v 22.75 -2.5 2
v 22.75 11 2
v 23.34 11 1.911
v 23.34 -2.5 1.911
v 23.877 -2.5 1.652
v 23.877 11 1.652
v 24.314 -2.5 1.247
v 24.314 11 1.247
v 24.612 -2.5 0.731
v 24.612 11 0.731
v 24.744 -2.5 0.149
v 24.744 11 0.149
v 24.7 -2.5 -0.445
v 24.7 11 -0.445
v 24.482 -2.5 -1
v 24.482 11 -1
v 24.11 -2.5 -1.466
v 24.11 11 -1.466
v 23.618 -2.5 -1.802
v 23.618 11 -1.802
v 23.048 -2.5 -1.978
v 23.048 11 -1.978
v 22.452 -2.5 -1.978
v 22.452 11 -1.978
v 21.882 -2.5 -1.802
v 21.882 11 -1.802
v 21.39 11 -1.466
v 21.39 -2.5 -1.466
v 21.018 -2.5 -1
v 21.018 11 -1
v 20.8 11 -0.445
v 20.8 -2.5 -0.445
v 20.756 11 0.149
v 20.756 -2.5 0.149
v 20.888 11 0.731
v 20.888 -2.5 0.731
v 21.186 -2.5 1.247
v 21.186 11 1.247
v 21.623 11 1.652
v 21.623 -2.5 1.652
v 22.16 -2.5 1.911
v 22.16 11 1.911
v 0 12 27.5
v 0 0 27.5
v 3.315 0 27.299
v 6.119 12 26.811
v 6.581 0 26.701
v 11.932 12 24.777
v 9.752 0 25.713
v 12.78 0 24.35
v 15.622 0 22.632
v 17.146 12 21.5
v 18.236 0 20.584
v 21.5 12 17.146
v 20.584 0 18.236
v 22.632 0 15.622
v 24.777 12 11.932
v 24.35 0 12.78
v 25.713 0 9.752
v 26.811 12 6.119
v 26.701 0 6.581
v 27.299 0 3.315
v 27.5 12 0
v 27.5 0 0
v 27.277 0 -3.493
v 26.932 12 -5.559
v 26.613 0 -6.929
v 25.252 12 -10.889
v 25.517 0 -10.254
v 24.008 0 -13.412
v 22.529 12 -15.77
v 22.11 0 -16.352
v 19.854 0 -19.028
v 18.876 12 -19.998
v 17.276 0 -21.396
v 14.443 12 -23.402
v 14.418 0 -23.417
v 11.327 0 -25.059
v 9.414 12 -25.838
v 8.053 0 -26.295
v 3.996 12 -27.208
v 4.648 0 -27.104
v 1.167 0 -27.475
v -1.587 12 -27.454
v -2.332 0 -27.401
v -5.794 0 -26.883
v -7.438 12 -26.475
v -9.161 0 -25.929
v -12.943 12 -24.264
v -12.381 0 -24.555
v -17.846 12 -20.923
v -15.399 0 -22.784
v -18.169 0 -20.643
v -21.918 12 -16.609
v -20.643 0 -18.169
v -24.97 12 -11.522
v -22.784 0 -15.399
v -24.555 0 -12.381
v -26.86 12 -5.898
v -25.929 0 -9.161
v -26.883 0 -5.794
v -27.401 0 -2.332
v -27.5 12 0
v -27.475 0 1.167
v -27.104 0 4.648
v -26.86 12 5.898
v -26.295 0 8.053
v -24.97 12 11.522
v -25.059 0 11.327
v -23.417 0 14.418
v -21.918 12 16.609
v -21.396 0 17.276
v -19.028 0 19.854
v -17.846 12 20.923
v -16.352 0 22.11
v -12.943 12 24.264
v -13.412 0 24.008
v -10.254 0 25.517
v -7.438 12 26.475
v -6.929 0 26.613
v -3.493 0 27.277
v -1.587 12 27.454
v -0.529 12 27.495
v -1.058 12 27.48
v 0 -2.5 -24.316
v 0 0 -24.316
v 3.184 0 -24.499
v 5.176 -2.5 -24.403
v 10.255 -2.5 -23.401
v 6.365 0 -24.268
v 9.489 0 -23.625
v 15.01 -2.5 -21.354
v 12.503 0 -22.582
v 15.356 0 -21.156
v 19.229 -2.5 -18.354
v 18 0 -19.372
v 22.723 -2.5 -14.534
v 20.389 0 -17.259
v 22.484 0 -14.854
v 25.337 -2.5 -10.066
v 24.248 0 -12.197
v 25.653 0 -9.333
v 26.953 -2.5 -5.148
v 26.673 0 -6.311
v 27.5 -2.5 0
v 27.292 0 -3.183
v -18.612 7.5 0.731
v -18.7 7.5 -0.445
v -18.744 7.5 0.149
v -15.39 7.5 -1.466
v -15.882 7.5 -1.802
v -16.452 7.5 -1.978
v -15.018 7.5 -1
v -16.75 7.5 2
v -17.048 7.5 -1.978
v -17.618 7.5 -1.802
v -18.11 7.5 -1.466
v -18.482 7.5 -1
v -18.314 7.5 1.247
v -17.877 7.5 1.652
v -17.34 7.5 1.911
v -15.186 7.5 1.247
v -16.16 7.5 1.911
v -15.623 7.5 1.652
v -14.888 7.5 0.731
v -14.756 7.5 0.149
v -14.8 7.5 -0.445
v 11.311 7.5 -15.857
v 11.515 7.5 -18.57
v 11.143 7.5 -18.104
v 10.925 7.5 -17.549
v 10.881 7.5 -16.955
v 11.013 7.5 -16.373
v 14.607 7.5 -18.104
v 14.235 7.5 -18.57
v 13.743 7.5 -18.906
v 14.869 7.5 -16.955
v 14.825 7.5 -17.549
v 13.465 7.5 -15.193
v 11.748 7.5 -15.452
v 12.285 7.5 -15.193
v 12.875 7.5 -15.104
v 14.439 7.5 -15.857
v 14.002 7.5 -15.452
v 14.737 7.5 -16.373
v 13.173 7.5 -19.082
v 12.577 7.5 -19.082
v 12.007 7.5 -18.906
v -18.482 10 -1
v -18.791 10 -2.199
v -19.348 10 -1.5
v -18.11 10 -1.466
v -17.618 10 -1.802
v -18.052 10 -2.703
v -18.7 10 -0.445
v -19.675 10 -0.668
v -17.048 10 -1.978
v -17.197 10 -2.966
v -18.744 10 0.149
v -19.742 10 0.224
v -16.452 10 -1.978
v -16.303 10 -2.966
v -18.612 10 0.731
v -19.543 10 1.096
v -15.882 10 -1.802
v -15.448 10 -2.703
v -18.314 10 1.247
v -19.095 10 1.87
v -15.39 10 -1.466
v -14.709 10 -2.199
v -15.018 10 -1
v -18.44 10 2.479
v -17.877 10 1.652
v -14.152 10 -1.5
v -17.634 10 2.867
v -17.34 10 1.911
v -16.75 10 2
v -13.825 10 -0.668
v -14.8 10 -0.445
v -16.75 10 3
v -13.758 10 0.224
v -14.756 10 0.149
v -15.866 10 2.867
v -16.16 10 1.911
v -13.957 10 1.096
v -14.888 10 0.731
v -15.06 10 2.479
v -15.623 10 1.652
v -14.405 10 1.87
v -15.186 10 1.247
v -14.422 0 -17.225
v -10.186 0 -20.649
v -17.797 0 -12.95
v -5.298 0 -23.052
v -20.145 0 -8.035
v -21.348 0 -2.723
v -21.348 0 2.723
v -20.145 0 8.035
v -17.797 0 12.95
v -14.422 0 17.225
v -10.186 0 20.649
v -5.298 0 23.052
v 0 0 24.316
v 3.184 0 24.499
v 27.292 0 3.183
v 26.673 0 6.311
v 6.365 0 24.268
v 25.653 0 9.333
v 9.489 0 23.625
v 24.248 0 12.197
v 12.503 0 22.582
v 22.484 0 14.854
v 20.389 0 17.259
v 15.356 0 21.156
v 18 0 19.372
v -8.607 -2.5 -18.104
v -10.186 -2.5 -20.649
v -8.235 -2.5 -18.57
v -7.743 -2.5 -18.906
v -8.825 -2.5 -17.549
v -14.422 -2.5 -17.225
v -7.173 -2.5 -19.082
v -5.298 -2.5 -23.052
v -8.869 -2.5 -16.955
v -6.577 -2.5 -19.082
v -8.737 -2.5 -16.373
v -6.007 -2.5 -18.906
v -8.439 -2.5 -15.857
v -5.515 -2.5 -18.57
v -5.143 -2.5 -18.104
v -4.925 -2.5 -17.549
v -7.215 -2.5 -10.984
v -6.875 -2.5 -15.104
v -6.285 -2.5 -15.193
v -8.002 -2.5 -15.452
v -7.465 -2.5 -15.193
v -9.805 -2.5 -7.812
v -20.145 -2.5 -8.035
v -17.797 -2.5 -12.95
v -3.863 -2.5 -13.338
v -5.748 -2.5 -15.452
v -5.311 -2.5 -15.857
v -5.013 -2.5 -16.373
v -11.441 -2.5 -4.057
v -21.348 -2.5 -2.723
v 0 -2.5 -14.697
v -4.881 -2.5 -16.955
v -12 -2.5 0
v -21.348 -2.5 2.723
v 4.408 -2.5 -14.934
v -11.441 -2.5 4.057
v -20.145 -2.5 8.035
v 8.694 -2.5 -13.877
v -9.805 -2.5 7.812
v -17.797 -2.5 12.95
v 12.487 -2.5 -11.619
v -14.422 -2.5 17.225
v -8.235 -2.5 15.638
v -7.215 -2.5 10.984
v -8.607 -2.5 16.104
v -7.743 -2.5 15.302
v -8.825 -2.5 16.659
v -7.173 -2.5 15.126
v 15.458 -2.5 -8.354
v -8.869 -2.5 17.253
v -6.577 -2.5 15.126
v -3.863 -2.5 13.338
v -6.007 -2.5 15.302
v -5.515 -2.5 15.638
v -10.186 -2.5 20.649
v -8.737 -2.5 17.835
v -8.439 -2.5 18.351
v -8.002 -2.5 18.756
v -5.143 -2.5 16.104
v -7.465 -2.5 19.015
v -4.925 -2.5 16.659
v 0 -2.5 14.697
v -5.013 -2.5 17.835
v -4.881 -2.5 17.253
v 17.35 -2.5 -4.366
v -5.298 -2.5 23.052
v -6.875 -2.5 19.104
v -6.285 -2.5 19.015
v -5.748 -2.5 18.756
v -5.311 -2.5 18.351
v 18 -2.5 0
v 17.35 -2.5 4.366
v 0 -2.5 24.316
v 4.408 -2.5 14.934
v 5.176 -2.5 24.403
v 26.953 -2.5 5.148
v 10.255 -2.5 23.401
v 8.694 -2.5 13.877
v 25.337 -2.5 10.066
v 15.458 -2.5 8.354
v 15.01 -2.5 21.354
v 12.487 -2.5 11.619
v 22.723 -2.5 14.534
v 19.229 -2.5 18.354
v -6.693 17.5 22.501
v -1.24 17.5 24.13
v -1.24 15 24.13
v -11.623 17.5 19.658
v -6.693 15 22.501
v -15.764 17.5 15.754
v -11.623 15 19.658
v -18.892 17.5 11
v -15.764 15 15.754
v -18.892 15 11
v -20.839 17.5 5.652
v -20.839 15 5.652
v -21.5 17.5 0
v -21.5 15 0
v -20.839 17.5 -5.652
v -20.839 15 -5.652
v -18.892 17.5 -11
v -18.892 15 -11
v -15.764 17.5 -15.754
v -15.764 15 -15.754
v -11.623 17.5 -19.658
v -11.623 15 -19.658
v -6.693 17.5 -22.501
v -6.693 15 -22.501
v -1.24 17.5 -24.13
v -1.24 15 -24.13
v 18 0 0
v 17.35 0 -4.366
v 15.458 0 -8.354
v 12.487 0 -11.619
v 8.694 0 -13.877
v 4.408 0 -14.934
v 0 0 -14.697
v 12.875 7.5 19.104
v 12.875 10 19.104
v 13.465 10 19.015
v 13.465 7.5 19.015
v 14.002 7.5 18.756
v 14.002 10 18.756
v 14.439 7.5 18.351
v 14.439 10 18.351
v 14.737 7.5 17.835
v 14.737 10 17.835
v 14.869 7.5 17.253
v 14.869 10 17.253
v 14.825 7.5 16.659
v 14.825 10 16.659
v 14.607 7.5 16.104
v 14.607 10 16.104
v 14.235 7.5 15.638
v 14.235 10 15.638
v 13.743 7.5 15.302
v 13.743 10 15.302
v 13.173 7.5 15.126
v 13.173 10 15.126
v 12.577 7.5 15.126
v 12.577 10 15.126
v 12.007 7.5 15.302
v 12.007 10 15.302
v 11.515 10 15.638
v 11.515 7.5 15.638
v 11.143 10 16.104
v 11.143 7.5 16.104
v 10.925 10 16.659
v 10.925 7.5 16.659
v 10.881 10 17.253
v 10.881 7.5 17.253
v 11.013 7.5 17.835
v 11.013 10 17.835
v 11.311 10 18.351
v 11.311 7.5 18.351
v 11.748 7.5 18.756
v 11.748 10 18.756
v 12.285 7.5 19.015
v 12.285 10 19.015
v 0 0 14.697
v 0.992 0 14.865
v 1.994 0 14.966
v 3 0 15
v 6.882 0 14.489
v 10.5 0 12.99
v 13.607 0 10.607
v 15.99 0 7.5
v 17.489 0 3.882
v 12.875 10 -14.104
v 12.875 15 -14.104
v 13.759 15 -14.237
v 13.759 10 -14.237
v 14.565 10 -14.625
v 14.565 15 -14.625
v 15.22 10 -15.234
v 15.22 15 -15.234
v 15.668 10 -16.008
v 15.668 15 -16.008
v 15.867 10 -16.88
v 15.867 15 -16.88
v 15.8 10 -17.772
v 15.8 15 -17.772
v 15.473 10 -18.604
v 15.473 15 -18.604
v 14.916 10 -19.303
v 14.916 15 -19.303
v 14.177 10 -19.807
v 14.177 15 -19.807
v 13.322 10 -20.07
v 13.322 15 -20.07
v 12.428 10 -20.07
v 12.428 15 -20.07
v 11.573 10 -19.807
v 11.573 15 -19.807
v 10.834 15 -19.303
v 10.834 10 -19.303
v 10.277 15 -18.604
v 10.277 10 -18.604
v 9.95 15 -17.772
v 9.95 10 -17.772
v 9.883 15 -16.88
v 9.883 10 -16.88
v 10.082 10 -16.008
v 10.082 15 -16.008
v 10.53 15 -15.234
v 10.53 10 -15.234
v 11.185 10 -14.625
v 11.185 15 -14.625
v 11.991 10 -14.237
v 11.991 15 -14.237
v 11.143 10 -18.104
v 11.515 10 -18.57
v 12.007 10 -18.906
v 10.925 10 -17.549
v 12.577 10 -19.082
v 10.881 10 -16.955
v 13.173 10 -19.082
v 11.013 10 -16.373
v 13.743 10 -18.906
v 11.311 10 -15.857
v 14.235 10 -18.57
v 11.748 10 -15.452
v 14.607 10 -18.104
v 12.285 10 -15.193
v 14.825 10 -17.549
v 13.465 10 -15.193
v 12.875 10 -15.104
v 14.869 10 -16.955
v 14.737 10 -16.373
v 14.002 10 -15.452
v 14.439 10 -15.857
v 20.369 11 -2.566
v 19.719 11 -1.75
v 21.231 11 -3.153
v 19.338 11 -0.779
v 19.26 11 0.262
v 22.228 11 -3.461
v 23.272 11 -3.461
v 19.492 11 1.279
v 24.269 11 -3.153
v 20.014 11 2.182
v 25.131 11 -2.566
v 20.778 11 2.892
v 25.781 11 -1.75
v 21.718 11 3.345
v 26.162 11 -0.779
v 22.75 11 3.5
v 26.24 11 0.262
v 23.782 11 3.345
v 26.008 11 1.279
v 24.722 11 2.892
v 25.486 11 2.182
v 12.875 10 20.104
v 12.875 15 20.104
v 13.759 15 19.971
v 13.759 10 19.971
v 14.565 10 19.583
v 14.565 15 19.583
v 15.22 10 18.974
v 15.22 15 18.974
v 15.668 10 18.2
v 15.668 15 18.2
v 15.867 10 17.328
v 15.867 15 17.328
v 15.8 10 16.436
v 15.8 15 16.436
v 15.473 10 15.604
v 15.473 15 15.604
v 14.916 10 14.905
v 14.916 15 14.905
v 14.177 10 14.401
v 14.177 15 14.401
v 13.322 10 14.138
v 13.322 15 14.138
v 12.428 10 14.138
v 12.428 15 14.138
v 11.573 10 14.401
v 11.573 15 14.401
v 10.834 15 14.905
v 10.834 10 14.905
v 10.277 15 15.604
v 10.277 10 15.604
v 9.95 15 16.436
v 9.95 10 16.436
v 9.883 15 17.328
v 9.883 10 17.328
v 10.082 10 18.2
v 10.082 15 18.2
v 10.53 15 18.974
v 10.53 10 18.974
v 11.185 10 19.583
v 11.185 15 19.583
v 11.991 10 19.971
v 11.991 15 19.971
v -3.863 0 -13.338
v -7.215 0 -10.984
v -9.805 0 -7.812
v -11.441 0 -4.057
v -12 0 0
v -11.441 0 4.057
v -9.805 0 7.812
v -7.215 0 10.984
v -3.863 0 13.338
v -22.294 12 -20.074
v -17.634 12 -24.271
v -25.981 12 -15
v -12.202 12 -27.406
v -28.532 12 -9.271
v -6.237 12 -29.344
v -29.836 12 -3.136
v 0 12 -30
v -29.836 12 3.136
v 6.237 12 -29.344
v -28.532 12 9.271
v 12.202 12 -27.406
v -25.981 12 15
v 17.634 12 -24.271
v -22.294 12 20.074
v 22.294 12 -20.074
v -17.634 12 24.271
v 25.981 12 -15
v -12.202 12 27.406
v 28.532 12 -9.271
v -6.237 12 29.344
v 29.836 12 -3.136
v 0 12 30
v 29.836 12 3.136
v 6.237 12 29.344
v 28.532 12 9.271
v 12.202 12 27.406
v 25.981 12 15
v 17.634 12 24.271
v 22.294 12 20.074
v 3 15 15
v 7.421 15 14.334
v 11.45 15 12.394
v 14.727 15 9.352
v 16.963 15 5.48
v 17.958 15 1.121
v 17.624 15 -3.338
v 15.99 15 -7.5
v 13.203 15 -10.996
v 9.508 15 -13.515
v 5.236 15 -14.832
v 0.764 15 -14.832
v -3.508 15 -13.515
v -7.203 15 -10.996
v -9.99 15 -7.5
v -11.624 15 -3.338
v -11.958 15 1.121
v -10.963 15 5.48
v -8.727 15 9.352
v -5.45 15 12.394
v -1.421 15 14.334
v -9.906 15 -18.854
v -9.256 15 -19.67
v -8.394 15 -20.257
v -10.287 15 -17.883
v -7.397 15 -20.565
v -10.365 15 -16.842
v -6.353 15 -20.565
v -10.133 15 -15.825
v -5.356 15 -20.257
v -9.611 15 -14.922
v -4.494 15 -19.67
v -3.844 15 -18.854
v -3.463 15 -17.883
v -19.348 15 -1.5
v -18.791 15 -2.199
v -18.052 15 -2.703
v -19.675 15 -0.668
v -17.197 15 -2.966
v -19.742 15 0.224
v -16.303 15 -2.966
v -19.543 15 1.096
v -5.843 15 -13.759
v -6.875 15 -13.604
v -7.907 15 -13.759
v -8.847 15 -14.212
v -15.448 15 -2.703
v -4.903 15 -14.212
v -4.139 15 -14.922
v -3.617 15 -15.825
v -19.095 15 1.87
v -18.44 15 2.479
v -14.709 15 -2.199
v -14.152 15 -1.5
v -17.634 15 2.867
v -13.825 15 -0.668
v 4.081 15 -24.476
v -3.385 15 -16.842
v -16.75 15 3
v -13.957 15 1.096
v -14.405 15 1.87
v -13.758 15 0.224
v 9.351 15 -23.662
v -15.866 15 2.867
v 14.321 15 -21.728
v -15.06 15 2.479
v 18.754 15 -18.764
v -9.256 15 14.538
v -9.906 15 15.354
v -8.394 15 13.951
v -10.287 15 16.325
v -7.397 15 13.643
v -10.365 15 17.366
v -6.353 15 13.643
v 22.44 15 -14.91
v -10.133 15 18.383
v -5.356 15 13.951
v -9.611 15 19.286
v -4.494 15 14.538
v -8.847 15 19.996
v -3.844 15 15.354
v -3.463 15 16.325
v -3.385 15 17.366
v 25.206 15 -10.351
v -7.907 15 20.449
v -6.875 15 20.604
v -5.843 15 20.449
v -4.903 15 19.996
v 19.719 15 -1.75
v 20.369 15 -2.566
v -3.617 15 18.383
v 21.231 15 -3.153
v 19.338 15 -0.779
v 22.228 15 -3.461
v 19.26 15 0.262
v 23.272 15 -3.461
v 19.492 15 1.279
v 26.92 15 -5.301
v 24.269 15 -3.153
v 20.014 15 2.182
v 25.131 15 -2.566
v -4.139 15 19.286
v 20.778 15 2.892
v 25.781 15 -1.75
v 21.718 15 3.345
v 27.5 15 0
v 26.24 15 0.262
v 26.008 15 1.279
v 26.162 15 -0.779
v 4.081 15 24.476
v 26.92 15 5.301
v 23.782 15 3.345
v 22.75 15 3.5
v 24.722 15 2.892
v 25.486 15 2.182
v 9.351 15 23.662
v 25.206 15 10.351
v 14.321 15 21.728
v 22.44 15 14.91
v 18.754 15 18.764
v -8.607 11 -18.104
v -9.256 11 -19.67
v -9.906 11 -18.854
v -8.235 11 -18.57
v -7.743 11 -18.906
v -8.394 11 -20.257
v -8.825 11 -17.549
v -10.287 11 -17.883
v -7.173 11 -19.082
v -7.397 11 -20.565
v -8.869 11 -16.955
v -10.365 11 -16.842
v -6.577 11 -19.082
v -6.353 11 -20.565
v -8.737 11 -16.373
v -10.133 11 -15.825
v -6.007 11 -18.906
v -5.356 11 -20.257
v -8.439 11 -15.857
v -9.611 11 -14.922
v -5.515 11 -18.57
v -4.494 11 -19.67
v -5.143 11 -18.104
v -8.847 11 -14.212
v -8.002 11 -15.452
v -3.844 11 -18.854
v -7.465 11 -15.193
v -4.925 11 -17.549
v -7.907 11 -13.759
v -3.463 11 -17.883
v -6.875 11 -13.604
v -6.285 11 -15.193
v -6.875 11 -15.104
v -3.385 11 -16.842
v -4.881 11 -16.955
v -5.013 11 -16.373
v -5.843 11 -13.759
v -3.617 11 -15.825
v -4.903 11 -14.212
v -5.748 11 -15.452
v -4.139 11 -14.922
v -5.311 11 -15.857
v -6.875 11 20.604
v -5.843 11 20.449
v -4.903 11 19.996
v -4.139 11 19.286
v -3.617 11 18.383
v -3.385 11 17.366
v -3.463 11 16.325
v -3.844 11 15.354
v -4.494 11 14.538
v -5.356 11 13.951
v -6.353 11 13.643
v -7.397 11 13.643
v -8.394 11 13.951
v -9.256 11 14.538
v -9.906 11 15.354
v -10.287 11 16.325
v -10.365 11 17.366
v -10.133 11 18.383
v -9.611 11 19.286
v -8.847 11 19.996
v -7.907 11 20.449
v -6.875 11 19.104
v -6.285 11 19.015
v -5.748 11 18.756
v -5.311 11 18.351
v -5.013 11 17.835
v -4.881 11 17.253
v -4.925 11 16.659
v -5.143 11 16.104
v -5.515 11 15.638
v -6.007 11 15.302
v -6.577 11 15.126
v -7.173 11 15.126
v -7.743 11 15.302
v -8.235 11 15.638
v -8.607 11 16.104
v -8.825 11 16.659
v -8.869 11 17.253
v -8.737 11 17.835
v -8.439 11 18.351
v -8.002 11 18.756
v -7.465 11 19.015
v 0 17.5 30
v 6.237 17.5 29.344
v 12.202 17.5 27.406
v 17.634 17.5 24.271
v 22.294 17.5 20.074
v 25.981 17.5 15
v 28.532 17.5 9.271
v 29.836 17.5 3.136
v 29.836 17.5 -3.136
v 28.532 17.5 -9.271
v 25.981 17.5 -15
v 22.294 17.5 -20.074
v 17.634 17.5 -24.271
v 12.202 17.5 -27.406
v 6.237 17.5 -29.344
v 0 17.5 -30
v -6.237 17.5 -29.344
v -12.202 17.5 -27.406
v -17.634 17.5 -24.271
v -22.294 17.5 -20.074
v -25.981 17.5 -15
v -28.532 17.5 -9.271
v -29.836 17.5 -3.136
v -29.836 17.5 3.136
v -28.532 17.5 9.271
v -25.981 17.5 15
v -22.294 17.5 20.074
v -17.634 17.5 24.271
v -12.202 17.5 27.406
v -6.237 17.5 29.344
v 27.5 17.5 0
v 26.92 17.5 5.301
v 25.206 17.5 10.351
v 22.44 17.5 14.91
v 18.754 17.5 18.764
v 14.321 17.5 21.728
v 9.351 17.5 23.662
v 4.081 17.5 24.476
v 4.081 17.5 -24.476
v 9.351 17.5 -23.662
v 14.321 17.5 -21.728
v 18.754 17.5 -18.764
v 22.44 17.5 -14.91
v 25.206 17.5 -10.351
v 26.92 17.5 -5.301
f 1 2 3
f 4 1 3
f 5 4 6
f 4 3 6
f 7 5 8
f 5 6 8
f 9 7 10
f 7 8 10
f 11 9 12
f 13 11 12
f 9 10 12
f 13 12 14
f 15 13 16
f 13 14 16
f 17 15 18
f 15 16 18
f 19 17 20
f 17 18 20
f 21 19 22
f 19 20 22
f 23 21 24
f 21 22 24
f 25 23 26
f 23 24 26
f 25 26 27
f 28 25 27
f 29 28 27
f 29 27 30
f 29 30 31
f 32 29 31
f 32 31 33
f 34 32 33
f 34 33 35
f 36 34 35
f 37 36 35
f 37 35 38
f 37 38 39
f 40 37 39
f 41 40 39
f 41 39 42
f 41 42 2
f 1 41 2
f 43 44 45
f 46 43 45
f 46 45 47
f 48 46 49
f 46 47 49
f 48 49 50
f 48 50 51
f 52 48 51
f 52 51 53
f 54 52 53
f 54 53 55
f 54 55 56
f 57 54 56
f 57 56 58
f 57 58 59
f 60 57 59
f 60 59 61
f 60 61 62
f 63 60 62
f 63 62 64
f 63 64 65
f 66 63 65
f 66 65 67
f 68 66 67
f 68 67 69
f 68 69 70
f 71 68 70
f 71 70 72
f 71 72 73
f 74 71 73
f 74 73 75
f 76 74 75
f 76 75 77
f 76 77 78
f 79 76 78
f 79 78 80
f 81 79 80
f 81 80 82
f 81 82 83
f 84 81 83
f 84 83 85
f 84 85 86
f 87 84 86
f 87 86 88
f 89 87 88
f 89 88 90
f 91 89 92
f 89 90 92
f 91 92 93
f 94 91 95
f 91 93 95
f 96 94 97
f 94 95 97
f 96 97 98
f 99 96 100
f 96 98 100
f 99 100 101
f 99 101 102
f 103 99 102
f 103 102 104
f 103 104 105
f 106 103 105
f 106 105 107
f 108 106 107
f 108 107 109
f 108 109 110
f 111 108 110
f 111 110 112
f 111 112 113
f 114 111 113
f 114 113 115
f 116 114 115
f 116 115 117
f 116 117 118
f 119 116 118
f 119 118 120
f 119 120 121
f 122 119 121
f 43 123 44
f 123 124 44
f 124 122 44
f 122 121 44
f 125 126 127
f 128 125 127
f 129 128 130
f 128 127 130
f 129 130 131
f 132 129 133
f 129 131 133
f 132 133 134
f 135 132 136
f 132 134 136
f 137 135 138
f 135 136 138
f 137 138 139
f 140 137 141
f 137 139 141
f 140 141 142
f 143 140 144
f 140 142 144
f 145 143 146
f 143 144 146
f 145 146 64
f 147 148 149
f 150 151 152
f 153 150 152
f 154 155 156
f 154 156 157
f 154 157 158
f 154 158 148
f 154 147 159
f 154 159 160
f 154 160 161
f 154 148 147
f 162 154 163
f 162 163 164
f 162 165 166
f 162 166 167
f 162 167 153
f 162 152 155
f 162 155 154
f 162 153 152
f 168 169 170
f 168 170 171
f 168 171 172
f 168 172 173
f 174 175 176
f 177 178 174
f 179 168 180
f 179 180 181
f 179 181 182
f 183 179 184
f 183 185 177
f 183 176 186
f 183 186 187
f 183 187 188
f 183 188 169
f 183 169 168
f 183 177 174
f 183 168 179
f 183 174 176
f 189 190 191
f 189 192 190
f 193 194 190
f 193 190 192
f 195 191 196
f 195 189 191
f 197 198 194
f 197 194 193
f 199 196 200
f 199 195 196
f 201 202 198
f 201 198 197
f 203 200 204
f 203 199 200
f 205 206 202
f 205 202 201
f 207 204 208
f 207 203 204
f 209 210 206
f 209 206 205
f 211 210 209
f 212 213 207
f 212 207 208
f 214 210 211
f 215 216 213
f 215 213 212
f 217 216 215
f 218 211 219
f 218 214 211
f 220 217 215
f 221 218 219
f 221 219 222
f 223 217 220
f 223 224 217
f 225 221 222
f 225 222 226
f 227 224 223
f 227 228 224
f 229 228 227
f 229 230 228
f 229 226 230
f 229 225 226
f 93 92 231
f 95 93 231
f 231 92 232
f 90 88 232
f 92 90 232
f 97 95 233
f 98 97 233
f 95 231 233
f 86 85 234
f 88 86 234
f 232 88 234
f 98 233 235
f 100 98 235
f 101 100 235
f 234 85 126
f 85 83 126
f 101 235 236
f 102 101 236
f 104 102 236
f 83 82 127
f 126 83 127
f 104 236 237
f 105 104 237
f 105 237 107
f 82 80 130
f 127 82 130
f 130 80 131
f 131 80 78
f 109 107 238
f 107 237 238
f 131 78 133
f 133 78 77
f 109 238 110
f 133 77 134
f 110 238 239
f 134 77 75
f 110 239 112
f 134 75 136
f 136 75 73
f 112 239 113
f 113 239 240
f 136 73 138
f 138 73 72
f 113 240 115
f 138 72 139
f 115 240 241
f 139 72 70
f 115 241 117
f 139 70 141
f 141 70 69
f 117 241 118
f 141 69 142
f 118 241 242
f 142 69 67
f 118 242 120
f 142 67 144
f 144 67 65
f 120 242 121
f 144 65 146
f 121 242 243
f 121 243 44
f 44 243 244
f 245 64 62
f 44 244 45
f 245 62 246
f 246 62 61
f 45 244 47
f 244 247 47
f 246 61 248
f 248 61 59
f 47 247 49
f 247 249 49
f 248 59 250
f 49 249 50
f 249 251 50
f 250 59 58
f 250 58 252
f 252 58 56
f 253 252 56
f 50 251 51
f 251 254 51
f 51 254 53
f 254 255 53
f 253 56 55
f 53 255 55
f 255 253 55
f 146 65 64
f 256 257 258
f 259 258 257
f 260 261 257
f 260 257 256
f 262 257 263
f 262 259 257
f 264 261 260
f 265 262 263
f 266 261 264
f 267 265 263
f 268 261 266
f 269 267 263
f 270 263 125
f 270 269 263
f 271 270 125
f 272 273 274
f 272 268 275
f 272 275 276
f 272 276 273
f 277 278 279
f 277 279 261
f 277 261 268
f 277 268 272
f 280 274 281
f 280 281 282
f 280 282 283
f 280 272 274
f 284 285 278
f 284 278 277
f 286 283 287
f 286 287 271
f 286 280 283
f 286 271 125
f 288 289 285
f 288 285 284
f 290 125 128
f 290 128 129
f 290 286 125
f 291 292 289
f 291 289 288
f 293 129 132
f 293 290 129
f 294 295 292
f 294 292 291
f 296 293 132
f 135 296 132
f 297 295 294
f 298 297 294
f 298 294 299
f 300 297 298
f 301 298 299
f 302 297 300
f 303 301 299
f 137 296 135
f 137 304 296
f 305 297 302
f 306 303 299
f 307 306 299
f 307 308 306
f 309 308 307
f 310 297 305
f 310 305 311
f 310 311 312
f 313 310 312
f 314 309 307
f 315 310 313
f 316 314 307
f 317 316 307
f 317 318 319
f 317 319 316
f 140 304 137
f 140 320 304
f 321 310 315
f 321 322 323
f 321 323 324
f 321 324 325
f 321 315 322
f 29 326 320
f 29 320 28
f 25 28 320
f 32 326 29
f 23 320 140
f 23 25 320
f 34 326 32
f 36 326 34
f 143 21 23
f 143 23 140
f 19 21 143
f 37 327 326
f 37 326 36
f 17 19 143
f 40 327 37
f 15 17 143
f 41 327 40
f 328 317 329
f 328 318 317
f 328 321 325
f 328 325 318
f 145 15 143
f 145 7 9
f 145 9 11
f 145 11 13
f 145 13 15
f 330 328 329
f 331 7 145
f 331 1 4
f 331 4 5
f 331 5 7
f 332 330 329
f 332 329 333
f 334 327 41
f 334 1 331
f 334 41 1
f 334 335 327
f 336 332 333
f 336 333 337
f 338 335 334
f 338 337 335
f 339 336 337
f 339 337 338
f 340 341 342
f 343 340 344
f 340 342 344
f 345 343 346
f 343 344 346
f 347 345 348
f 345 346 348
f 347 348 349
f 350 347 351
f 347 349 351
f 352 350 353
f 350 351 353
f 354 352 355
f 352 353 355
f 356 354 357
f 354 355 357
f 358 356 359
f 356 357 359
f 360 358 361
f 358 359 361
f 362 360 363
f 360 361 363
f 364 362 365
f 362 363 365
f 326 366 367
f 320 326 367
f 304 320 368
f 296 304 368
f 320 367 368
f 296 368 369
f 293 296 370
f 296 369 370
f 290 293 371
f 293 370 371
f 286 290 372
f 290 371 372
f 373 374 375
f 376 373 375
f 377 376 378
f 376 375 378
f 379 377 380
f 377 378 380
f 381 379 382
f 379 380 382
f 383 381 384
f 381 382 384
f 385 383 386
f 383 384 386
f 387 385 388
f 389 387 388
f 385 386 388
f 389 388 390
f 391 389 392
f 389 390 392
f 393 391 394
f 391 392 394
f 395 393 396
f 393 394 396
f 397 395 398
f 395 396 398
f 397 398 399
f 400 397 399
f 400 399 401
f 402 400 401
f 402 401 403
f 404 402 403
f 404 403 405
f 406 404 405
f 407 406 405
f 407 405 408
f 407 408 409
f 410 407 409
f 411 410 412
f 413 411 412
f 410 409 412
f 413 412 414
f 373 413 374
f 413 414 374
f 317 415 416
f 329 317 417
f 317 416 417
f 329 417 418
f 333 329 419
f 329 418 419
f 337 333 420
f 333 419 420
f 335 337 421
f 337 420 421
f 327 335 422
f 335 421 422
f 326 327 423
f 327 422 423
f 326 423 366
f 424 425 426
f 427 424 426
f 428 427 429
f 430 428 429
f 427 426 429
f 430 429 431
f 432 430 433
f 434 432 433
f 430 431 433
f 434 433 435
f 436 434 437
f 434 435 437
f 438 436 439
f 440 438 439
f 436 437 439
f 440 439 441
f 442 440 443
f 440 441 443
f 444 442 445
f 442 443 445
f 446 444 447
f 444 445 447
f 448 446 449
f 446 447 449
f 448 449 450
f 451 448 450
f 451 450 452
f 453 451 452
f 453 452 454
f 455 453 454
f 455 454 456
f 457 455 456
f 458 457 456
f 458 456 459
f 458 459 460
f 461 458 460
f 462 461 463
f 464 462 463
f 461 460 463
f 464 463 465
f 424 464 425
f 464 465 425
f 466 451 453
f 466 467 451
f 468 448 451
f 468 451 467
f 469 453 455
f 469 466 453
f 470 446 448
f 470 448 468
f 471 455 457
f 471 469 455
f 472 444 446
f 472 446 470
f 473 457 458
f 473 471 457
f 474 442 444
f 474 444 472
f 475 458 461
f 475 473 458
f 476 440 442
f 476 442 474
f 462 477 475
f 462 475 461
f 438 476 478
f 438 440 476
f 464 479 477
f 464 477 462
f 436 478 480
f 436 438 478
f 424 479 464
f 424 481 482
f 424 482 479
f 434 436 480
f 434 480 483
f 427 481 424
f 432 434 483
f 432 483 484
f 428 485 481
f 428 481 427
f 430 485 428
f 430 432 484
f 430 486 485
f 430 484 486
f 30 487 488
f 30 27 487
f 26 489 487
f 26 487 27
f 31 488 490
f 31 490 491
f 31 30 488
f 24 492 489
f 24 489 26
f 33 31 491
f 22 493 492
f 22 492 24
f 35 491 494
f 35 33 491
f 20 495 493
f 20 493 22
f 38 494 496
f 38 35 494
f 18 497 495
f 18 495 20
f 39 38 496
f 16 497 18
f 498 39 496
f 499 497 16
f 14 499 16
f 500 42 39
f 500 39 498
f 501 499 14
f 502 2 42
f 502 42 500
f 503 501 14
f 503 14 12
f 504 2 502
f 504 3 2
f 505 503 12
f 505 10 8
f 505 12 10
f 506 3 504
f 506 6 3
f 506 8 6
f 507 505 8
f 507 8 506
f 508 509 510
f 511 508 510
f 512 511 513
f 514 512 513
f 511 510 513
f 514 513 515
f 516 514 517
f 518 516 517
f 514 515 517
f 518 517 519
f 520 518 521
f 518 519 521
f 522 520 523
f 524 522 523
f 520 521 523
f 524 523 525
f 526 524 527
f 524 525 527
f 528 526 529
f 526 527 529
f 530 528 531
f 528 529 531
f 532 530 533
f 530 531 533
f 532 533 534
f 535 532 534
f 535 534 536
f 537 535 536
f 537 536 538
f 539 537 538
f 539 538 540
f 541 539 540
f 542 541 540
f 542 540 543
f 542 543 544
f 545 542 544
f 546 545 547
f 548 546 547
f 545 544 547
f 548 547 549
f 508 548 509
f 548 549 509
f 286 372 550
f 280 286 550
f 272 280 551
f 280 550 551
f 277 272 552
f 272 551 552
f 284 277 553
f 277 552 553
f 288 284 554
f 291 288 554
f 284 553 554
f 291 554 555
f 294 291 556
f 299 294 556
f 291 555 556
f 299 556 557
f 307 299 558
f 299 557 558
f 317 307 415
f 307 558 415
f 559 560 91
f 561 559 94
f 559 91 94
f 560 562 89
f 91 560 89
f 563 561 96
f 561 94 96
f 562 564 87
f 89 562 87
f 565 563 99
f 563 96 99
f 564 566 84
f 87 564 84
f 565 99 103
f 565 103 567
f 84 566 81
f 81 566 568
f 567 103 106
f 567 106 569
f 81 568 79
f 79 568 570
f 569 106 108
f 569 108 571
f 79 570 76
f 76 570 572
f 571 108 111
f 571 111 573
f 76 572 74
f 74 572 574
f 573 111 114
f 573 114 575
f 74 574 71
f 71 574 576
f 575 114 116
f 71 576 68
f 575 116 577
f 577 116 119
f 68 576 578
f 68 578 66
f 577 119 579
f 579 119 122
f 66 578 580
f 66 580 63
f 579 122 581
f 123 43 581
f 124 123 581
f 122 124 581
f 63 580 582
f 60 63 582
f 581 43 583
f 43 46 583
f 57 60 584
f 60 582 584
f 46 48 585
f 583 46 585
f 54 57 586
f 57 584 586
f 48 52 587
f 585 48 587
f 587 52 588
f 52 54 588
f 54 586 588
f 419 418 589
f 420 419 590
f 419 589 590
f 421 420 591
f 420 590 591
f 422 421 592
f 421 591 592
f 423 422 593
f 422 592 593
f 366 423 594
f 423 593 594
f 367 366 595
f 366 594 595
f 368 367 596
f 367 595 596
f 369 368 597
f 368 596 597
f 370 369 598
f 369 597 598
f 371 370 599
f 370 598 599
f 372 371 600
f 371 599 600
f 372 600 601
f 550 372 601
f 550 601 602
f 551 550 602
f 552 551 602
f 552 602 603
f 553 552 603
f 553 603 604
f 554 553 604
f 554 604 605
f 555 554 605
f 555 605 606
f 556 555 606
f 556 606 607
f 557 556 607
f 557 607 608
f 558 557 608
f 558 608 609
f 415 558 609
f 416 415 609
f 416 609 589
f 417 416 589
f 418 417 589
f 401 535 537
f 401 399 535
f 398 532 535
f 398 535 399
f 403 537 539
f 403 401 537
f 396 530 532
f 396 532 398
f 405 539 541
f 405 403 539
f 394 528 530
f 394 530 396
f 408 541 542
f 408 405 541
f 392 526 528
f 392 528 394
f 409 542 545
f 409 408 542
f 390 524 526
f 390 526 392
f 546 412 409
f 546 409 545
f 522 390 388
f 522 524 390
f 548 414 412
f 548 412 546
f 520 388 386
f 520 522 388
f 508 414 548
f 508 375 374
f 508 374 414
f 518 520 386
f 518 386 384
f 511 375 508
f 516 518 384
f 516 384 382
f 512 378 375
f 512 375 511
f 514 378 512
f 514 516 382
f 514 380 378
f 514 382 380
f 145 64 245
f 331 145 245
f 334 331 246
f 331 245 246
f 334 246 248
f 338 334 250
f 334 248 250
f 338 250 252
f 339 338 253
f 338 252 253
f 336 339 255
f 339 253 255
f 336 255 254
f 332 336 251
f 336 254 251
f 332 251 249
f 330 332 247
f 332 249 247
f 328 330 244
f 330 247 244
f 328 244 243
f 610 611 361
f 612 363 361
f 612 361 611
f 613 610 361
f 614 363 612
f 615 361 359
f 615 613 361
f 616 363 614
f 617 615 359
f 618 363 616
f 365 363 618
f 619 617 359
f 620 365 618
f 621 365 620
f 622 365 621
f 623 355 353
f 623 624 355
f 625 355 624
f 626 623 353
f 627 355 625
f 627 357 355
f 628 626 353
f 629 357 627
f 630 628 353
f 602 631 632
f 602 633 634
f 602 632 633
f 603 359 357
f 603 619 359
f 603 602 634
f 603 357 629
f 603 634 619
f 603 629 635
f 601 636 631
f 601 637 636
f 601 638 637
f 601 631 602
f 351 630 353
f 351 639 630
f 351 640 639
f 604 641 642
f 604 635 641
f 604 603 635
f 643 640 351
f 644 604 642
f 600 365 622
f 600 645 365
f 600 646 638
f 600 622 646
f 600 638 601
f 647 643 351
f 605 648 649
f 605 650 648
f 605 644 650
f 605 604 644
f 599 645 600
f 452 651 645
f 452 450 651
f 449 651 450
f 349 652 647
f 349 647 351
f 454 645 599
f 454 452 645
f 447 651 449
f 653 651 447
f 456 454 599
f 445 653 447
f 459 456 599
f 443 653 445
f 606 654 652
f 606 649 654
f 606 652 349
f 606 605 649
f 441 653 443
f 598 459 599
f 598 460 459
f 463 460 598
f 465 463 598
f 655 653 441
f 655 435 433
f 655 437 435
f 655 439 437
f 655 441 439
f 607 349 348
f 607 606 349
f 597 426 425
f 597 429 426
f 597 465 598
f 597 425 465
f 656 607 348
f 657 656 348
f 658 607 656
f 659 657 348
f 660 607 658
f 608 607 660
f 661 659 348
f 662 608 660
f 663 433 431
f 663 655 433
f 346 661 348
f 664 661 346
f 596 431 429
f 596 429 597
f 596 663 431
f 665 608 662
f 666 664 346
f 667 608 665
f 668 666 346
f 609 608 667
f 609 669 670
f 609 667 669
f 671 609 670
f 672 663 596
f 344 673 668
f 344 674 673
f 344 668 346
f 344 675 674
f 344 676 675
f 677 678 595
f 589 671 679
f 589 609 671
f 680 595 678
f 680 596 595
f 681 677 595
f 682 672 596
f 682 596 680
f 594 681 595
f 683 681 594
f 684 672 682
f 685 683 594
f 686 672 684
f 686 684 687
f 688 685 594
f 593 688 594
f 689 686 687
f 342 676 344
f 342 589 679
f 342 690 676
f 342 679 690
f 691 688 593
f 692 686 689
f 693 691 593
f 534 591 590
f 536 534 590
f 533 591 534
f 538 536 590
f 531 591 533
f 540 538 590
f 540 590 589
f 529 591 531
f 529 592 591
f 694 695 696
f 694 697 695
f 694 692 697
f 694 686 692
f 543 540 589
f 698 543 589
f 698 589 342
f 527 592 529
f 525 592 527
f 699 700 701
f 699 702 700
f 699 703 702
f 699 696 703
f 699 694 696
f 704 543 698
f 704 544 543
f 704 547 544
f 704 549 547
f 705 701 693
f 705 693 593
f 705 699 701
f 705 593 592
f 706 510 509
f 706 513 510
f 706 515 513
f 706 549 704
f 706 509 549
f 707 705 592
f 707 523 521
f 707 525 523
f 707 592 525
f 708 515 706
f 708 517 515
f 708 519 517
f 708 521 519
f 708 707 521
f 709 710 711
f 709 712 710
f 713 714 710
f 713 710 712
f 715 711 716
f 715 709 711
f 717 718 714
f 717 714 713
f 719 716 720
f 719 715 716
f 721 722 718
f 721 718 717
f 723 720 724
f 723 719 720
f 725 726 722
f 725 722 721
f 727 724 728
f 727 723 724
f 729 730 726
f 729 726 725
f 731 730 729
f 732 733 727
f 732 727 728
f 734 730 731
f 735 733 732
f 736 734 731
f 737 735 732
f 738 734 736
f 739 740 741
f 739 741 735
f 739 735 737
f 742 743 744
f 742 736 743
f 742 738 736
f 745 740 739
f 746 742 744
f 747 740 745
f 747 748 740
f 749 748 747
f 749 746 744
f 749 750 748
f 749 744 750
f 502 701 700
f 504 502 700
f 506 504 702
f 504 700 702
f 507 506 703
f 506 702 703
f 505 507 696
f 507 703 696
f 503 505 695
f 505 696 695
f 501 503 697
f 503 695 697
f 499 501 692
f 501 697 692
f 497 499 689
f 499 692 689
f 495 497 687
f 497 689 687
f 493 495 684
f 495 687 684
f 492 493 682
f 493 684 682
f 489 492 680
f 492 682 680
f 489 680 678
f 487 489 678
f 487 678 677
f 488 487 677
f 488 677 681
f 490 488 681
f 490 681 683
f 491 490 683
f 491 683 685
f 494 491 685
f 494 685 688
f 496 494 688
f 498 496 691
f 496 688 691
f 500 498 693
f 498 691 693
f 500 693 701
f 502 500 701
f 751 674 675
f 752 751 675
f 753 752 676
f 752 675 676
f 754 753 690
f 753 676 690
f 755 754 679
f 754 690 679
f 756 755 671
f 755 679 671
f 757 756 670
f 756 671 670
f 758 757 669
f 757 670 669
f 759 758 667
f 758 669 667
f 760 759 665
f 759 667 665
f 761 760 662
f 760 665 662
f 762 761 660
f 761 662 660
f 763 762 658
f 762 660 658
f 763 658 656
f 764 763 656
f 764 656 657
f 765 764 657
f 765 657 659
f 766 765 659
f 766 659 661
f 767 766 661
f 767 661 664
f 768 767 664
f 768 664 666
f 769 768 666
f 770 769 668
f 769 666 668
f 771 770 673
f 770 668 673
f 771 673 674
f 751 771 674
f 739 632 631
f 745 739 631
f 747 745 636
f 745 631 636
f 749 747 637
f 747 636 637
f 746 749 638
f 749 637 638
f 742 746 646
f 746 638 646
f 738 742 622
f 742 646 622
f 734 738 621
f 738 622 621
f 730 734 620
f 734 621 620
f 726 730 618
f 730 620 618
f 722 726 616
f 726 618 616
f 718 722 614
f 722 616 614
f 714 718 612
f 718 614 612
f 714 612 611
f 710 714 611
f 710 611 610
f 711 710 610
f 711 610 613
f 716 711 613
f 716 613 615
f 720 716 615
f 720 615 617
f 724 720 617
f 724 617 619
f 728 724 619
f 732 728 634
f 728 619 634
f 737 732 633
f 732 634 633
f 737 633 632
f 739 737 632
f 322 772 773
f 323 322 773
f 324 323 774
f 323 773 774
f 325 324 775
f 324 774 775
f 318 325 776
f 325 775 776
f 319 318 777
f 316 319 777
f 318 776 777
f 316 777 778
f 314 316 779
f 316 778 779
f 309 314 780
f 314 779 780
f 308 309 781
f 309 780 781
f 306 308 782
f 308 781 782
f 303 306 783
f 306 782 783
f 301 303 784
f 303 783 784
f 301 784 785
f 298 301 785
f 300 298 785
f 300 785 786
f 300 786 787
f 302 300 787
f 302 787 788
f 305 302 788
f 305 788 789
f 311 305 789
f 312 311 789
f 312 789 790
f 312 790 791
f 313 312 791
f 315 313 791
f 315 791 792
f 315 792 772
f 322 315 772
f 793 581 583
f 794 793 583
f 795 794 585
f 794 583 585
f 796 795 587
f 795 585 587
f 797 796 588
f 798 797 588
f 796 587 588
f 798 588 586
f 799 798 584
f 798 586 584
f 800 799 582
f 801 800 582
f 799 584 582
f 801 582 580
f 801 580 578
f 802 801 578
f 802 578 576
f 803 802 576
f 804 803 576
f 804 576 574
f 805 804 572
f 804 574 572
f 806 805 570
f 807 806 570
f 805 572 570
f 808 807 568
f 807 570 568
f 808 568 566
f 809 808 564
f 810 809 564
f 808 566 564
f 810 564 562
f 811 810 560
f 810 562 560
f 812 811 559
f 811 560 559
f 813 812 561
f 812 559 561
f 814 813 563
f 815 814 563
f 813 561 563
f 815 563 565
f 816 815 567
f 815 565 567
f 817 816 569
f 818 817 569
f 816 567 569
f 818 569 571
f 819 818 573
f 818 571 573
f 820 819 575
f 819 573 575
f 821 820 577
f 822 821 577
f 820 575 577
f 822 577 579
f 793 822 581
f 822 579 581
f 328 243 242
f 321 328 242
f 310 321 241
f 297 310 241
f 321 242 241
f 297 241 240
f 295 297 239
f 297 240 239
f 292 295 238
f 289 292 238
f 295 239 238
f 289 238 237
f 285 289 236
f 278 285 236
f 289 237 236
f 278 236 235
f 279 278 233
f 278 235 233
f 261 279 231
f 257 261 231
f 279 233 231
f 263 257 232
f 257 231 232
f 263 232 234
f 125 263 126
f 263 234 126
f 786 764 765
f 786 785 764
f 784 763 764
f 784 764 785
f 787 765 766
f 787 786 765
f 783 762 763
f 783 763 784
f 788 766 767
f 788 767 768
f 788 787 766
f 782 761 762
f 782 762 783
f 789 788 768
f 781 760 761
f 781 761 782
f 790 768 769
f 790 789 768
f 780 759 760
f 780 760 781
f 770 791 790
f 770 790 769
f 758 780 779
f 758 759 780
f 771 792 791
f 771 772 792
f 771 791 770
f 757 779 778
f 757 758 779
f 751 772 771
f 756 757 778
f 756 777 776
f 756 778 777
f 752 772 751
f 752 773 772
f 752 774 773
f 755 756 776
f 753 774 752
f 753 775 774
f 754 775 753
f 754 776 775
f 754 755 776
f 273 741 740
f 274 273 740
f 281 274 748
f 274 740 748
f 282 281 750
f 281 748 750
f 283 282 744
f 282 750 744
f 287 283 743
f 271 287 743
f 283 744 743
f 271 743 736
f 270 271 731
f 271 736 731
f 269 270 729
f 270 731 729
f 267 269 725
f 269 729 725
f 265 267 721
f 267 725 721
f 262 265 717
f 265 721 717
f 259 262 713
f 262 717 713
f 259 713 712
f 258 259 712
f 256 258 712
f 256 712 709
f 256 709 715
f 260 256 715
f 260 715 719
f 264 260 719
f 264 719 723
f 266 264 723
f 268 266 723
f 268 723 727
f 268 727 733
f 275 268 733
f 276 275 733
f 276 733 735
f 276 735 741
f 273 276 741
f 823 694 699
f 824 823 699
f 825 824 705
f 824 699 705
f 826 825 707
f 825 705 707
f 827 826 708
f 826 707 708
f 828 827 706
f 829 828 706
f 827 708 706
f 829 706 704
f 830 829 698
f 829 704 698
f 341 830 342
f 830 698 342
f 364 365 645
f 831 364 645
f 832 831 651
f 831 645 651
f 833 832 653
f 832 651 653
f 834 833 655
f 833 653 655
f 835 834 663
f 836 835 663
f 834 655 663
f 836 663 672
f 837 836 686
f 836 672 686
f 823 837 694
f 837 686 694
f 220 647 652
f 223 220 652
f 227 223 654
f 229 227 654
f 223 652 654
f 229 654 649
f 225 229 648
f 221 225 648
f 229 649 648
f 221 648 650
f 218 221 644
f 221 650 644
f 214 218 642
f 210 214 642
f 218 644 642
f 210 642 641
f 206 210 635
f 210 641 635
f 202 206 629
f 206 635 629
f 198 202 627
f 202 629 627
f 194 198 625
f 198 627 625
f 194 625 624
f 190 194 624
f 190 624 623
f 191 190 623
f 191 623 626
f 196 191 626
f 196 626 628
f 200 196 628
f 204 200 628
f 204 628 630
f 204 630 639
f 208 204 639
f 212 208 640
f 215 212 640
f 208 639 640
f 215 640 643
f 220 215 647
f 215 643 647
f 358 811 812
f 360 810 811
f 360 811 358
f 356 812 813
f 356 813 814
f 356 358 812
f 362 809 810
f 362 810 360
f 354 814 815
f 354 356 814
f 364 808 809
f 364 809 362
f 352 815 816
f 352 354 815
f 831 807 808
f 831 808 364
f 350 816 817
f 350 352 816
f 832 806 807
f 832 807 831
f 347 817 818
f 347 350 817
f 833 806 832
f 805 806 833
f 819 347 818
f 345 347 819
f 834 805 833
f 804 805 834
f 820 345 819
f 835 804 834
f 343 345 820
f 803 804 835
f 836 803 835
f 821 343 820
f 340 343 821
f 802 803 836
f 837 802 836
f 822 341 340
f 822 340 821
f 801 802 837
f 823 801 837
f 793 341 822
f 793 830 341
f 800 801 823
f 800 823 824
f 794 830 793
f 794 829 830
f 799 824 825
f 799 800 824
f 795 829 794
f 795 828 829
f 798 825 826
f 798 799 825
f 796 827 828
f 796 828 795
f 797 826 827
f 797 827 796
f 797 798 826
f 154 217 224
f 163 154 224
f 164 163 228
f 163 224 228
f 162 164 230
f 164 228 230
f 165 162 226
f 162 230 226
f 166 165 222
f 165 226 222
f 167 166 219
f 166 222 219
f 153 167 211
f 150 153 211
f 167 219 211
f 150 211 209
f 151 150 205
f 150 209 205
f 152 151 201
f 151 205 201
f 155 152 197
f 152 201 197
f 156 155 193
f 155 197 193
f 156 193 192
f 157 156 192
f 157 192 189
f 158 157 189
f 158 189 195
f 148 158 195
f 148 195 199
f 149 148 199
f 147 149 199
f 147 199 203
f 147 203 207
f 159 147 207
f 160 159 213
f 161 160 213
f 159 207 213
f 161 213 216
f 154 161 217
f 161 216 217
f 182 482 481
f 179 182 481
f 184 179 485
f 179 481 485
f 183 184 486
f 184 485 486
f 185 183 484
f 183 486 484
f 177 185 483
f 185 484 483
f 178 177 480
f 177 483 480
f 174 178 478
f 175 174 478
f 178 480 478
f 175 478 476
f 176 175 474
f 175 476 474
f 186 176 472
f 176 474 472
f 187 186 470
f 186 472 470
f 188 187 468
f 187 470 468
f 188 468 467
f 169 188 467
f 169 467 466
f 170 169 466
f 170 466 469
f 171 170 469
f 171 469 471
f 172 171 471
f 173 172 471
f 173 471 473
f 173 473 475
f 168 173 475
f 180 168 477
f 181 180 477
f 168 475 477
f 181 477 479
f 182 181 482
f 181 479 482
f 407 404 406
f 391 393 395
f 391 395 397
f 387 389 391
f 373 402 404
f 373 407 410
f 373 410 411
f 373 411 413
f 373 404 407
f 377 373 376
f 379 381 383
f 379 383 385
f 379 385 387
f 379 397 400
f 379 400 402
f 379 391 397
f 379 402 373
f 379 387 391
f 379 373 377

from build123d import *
from build123d.topology import SkipClean

# Parameters (mm, degrees)
SKETCH1_R            = 27.5
BOSS_EXTRUDE1_DEPTH  = 15
BOSS_EXTRUDE3_DEPTH  = 2.5
FILLET2_R            = 1.5
SKETCH4_R            = 3
CUT_EXTRUDE1_DEPTH   = 5
SKETCH5_R            = 15
CUT_EXTRUDE2_DEPTH   = 15
SKETCH7_R            = 24.5
SKETCH7_R_2          = 15
BOSS_EXTRUDE6_DEPTH  = 2.5
SKETCH8_R            = 2
CUT_EXTRUDE3_DEPTH   = 17.5
SKETCH9_R            = 3.5
SKETCH9_R_2          = 2
CUT_EXTRUDE4_DEPTH   = 4
SKETCH10_R           = 2
CUT_EXTRUDE5_DEPTH   = 2.5
SKETCH14_R           = 30
SKETCH14_R_2         = 24.5
BOSS_EXTRUDE14_DEPTH = 5.5


with BuildPart() as part:
    # Sketch1 → Boss-Extrude1 (new body)
    with BuildSketch(Plane(origin=(0, 0, 0), x_dir=(1, 0, 0), z_dir=(0, 1, 0))):
        Circle(SKETCH1_R)
    extrude(amount=BOSS_EXTRUDE1_DEPTH)

    # Sketch3 → Boss-Extrude3 (add)
    with BuildSketch(Plane(origin=(0, 15, 0), x_dir=(1, 0, 0), z_dir=(0, 1, 0))):
        with BuildLine():
            ThreePointArc((0, -24.315632832), (-21.5, 0), (0, 24.315632832))
            Line((0, 24.315632832), (0, 27.5))
            ThreePointArc((0, 27.5), (-27.5, 0), (0, -27.5))
            Line((0, -27.5), (0, -24.315632832))
        make_face()
    extrude(amount=BOSS_EXTRUDE3_DEPTH)

    # Fillet2
    fillet2_edges = [part.edges().sort_by_distance(p)[0] for p in [
        (0, 16.25, -27.5),
        (0, 16.25, -24.315632832),
        (0, 16.25, 24.315632832),
        (0, 16.25, 27.5),
    ]]
    fillet(fillet2_edges, radius=FILLET2_R)

    # Sketch4 → Cut-Extrude1 (cut)
    with BuildSketch(Plane(origin=(0, 15, 0), x_dir=(1, 0, 0), z_dir=(0, 1, 0))):
        with Locations((-16.75, 0)):
            Circle(SKETCH4_R)
        with Locations((12.875, 17.104001725)):
            Circle(SKETCH4_R)
        with Locations((12.875, -17.104001725)):
            Circle(SKETCH4_R)
    extrude(amount=-CUT_EXTRUDE1_DEPTH, mode=Mode.SUBTRACT)

    # Sketch5 → Cut-Extrude2 (cut)
    with BuildSketch(Plane(origin=(0, 15, 0), x_dir=(1, 0, 0), z_dir=(0, 1, 0))):
        with Locations((3, 0)):
            Circle(SKETCH5_R)
    extrude(amount=-CUT_EXTRUDE2_DEPTH, mode=Mode.SUBTRACT)

    # Sketch7 → Boss-Extrude6 (add)
    with BuildSketch(Plane.XZ):
        with Locations((3, 0)):
            Circle(SKETCH7_R)
        with Locations((3, 0)):
            Circle(SKETCH7_R_2, mode=Mode.SUBTRACT)
    extrude(amount=BOSS_EXTRUDE6_DEPTH)

    # Sketch8 → Cut-Extrude3 (cut)
    with BuildSketch(Plane(origin=(0, 15, 0), x_dir=(1, 0, 0), z_dir=(0, 1, 0))):
        with Locations((-6.875, 17.104001725)):
            Circle(SKETCH8_R)
        with Locations((22.75, 0)):
            Circle(SKETCH8_R)
        with Locations((-6.875, -17.104001725)):
            Circle(SKETCH8_R)
    extrude(amount=-CUT_EXTRUDE3_DEPTH, mode=Mode.SUBTRACT)

    # Sketch9 → Cut-Extrude4 (cut)
    # profile 1 of 3: a face of its own
    with BuildSketch(Plane(origin=(0, 15, 0), x_dir=(1, 0, 0), z_dir=(0, 1, 0))):
        with Locations((-6.875, 17.104001725)):
            Circle(SKETCH9_R)
        with Locations((-6.875, 17.104001725)):
            Circle(SKETCH9_R_2, mode=Mode.SUBTRACT)
    # profile 2 of 3: a face of its own
    with BuildSketch(Plane(origin=(0, 15, 0), x_dir=(1, 0, 0), z_dir=(0, 1, 0))):
        with Locations((22.75, 0)):
            Circle(SKETCH9_R)
        with Locations((22.75, 0)):
            Circle(SKETCH9_R_2, mode=Mode.SUBTRACT)
    # profile 3 of 3: a face of its own
    with BuildSketch(Plane(origin=(0, 15, 0), x_dir=(1, 0, 0), z_dir=(0, 1, 0))):
        with Locations((-6.875, -17.104001725)):
            Circle(SKETCH9_R)
        with Locations((-6.875, -17.104001725)):
            Circle(SKETCH9_R_2, mode=Mode.SUBTRACT)
    extrude(amount=-CUT_EXTRUDE4_DEPTH, mode=Mode.SUBTRACT)

    # Sketch10 → Cut-Extrude5 (cut)
    with BuildSketch(Plane(origin=(0, 10, 0), x_dir=(1, 0, 0), z_dir=(0, 1, 0))):
        with Locations((-16.75, 0)):
            Circle(SKETCH10_R)
        with Locations((12.875, 17.104001725)):
            Circle(SKETCH10_R)
        with Locations((12.875, -17.104001725)):
            Circle(SKETCH10_R)
    extrude(amount=-CUT_EXTRUDE5_DEPTH, mode=Mode.SUBTRACT)

    # Sketch14 → Boss-Extrude14 (add)
    with SkipClean():  # the faces are left unmerged after this step: merging them gives an invalid solid
        with BuildSketch(Plane(origin=(0, 17.5, 0), x_dir=(1, 0, 0), z_dir=(0, 1, 0))):
            Circle(SKETCH14_R)
            with Locations((3, 0)):
                Circle(SKETCH14_R_2, mode=Mode.SUBTRACT)
        extrude(amount=-BOSS_EXTRUDE14_DEPTH)


solid = part.part
